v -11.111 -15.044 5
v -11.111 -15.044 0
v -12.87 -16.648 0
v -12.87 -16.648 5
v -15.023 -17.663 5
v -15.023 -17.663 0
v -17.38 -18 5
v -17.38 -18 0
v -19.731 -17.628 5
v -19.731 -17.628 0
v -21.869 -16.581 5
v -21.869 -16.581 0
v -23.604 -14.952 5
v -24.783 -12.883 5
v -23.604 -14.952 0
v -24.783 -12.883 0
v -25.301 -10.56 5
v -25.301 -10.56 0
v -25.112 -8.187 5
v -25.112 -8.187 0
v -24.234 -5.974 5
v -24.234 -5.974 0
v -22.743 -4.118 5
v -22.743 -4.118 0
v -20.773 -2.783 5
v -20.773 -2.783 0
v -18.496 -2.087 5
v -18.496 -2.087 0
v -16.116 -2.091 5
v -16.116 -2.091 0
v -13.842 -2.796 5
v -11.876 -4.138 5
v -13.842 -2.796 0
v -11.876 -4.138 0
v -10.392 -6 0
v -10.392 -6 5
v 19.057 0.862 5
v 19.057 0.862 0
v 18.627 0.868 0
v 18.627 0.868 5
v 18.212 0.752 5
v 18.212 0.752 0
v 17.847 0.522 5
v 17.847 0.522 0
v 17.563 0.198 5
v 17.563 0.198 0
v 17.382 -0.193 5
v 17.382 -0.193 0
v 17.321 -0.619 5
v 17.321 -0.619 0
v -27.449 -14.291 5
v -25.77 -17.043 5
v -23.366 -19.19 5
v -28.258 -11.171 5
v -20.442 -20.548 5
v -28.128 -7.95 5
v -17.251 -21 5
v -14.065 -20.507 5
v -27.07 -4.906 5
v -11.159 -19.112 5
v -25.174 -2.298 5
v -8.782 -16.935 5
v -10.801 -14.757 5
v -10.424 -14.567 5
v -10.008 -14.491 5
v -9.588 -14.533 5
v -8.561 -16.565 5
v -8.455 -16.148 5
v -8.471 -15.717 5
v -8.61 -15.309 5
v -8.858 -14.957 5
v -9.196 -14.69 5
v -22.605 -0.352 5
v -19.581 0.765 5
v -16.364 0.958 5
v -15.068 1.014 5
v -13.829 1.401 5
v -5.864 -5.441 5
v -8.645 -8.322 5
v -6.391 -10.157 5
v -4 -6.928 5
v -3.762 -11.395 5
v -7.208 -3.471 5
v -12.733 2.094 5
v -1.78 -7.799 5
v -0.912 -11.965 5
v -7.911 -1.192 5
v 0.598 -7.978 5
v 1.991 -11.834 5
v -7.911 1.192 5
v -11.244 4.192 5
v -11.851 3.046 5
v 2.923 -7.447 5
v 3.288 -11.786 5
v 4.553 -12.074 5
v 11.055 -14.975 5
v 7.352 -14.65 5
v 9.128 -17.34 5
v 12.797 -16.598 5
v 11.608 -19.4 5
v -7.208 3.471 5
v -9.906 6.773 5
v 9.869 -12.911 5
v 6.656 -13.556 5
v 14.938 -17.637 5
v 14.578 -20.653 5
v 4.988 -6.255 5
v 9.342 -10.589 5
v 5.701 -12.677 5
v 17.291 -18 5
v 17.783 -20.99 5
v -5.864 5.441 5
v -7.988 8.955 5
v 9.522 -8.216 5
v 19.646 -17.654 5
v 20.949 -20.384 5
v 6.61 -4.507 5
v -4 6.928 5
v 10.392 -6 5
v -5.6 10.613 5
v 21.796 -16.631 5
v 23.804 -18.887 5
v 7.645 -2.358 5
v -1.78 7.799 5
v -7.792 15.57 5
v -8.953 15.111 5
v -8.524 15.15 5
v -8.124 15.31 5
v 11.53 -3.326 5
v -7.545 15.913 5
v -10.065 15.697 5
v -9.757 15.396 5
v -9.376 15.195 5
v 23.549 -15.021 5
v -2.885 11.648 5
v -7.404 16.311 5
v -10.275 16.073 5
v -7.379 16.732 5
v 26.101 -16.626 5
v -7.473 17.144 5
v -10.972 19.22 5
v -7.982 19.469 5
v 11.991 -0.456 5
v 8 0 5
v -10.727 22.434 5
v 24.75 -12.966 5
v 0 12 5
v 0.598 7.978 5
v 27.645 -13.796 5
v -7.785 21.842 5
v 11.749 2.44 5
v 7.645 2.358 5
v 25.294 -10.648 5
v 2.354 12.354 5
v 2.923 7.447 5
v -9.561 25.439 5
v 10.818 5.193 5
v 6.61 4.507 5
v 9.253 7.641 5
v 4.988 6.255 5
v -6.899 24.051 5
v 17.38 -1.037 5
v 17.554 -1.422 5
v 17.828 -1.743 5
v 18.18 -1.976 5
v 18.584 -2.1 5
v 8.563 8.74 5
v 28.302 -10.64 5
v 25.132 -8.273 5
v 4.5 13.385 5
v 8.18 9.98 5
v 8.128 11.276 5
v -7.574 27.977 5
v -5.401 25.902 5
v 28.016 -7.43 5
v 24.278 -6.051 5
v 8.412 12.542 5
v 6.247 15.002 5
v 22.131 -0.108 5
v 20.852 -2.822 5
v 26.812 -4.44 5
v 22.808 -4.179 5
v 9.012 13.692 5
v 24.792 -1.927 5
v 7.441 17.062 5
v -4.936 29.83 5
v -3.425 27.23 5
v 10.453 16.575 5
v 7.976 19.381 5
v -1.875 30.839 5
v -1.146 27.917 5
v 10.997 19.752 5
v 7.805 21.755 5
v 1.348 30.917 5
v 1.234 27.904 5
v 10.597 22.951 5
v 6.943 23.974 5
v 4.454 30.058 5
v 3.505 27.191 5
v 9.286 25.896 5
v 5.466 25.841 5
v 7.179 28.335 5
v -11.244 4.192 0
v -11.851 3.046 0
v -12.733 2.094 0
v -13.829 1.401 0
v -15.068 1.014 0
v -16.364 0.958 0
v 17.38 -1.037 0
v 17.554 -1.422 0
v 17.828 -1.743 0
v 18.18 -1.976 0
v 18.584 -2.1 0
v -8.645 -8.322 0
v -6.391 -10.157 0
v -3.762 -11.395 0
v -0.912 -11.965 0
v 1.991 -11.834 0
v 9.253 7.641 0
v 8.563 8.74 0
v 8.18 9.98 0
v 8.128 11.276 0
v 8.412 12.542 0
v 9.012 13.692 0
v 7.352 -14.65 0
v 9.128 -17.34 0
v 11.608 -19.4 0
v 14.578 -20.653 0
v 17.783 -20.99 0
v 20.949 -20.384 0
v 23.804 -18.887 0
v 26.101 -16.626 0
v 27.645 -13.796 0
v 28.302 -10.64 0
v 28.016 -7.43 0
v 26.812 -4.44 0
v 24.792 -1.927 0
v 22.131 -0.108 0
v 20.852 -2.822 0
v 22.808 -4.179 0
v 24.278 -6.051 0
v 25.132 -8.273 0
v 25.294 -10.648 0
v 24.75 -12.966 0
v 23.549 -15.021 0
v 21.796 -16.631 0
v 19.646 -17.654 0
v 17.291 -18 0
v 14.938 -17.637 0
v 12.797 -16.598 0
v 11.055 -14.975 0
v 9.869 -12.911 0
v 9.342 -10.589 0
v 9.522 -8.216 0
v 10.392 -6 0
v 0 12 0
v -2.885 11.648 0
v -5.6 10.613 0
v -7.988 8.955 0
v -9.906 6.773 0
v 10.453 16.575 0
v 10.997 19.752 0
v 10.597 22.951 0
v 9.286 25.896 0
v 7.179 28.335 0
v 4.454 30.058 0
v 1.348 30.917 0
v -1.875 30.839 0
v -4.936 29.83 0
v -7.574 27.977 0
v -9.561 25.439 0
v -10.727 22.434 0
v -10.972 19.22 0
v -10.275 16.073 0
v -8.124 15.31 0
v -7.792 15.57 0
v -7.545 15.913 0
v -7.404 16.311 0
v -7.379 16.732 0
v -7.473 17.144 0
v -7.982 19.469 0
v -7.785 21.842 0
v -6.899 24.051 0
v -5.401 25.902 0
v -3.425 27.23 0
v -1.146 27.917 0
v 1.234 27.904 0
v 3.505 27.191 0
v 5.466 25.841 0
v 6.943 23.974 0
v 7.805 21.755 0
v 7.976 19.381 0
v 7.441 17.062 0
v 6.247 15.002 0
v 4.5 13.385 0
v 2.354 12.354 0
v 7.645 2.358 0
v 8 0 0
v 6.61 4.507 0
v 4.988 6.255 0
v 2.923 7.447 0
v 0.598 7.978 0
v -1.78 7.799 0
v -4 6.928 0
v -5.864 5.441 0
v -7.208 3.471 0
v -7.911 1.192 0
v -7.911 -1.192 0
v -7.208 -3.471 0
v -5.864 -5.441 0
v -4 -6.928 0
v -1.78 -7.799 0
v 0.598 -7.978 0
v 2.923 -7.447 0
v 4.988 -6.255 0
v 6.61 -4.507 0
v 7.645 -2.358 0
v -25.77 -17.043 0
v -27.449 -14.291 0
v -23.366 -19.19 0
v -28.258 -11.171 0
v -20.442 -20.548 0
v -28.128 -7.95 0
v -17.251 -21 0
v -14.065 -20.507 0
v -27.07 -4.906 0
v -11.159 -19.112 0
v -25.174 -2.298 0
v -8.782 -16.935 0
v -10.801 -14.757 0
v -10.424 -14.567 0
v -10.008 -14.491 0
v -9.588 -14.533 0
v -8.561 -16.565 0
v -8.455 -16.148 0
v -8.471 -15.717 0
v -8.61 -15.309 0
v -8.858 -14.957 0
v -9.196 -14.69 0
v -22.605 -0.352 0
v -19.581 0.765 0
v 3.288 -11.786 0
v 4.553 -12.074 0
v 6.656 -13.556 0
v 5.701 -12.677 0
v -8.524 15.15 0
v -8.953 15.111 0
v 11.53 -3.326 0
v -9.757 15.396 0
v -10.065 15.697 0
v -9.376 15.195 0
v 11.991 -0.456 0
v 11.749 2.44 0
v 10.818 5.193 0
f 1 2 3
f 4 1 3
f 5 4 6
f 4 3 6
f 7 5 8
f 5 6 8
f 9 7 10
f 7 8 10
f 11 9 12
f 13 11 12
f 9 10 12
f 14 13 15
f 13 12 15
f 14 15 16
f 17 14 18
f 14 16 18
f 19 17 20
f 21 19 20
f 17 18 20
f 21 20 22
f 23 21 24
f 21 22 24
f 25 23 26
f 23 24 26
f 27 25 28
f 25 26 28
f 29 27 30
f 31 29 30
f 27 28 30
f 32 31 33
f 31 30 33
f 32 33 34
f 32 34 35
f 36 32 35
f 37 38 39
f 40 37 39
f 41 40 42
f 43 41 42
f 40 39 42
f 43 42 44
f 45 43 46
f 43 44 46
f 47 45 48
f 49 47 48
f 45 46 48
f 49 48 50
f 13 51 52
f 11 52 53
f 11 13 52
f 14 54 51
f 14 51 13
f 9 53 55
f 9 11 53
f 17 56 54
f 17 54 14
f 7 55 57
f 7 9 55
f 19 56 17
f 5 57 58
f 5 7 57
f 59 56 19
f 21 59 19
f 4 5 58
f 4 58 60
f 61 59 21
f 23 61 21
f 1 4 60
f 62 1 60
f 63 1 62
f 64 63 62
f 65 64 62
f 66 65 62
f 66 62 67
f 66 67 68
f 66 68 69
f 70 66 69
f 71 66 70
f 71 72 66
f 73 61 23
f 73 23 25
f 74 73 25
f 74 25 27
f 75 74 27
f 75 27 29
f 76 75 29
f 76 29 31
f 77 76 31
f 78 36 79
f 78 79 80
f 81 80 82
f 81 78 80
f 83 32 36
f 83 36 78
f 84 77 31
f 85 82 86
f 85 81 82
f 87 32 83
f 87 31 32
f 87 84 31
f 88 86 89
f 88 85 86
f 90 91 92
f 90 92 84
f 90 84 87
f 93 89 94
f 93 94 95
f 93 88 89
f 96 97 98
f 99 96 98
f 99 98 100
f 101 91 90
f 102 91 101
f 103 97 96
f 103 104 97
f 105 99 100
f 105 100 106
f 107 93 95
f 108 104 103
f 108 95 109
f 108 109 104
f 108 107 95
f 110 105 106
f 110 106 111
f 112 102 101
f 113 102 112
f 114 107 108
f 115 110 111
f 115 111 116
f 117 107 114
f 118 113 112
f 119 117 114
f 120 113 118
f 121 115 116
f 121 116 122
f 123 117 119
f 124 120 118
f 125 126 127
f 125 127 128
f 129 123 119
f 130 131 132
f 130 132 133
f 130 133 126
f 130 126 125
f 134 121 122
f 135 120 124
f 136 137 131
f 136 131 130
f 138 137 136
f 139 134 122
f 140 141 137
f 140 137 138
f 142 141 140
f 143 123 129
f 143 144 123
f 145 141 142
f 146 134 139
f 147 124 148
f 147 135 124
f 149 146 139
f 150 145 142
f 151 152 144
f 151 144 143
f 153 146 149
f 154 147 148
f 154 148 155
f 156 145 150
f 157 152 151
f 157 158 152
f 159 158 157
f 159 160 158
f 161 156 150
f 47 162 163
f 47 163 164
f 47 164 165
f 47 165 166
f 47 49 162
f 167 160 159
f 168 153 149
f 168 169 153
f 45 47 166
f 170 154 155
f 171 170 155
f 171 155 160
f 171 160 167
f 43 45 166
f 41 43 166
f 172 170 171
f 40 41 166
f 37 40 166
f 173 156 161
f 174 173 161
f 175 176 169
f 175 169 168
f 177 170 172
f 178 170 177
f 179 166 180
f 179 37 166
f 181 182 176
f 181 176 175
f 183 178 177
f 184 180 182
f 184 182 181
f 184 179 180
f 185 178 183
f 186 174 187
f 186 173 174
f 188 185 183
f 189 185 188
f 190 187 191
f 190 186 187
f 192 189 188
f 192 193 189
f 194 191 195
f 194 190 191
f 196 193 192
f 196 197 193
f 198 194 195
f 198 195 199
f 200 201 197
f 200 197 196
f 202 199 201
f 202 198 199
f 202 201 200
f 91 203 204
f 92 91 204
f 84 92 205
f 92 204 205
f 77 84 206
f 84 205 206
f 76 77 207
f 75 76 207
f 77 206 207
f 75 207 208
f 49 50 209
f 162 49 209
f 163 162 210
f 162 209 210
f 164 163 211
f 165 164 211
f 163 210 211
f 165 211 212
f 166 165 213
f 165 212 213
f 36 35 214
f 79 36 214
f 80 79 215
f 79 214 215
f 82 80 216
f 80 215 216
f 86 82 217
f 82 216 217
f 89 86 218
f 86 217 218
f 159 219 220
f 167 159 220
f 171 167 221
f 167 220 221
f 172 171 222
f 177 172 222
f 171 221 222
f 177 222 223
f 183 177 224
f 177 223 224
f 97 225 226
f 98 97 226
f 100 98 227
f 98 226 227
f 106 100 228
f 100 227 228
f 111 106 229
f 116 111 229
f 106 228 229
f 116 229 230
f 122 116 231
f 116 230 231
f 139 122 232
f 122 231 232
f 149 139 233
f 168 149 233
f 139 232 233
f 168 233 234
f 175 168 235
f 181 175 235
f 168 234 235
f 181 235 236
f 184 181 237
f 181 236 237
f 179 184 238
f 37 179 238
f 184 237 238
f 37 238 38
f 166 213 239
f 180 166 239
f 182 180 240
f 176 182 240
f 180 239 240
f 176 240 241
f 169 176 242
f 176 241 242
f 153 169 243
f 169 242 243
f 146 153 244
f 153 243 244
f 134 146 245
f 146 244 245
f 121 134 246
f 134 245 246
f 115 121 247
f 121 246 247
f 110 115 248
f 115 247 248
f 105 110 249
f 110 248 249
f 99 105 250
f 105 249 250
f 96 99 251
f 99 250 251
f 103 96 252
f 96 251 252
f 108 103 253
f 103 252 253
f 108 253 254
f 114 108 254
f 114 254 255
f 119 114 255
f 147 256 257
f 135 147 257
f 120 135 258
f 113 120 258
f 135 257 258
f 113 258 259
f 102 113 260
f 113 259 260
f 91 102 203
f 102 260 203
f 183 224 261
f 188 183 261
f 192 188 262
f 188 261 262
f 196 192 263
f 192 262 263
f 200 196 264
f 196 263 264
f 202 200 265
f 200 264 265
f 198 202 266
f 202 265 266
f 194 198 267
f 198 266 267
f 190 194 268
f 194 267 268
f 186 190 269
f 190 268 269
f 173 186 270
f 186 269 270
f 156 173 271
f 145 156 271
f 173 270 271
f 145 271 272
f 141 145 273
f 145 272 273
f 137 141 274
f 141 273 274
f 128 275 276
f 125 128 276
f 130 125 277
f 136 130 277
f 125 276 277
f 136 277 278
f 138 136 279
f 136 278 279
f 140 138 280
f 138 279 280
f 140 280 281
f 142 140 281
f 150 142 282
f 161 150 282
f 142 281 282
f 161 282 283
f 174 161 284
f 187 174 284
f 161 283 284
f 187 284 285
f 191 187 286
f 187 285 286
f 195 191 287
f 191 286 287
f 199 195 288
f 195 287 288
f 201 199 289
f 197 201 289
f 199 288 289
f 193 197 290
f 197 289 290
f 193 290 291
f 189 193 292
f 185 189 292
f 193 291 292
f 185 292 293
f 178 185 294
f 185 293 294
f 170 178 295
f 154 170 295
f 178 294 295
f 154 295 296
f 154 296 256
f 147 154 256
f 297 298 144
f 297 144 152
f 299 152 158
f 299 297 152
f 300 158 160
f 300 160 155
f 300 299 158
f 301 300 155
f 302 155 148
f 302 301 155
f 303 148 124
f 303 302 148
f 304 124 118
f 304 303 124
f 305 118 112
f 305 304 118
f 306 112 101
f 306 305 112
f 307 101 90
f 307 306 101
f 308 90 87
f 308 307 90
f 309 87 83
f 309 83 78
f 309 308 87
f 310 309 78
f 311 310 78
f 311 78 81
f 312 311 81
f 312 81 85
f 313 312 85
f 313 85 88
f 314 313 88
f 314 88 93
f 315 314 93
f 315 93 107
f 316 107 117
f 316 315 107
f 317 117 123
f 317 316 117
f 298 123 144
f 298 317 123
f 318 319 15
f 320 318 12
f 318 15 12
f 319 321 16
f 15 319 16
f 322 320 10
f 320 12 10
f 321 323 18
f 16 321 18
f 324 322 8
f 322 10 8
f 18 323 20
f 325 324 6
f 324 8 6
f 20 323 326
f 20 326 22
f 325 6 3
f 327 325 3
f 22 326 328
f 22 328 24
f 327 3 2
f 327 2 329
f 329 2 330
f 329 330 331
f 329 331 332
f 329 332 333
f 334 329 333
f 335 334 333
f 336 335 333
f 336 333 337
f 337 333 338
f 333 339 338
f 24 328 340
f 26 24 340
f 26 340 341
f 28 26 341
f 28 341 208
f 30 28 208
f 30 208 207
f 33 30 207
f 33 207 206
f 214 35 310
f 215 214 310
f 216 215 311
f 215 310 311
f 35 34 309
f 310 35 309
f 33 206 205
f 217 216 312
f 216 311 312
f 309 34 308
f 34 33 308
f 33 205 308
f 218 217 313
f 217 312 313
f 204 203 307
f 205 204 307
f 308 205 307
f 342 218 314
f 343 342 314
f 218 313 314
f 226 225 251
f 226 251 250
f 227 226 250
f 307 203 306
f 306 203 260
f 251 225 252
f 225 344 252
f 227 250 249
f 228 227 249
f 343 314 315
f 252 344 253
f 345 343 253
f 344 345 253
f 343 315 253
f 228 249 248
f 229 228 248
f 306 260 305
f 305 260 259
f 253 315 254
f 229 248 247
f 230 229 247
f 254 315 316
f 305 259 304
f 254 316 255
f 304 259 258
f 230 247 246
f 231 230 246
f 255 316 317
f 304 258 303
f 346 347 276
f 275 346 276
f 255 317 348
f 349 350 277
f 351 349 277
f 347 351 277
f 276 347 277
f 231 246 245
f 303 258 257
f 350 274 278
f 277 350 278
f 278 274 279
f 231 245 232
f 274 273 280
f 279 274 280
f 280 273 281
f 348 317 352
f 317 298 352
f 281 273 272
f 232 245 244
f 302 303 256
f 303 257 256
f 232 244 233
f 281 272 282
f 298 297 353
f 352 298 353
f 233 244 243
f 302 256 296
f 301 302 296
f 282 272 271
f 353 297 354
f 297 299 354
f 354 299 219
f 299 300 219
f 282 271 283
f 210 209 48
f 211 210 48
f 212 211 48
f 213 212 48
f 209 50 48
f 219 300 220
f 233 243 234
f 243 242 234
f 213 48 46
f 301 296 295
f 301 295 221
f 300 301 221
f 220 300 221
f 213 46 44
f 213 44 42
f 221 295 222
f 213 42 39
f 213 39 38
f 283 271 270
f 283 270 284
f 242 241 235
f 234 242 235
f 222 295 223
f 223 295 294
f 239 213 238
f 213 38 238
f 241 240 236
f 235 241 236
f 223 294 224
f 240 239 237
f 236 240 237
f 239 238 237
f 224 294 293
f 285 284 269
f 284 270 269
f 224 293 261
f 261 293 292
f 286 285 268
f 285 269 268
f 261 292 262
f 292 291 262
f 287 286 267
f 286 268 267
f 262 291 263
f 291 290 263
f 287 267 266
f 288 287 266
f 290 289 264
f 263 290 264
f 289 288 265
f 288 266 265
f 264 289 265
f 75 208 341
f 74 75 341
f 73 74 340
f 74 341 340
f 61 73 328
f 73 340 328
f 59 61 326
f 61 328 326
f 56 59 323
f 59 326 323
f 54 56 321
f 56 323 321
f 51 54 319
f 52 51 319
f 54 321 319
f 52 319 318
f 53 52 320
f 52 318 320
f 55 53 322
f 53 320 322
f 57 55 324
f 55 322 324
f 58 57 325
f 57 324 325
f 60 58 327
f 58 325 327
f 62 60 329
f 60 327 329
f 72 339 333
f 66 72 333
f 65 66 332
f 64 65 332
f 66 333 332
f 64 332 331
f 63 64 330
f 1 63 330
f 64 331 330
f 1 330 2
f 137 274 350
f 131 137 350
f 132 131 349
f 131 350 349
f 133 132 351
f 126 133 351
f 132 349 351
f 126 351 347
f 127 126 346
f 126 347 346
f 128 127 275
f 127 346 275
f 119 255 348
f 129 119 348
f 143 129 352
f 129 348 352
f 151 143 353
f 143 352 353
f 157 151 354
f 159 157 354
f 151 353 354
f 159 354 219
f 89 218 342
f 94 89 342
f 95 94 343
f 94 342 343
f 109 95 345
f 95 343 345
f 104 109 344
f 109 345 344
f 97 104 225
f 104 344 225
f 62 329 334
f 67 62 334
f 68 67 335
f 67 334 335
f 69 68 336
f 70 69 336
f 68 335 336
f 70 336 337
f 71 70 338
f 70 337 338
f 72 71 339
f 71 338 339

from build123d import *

# Parameters (mm, degrees)
F0_R     = 8
F1_DEPTH = 5


with BuildPart() as f1:
    # F0 (on Top) → F1 (new body)
    with BuildSketch(Plane.XY):
        with BuildLine():
            ThreePointArc((-7.472874, 17.144103), (4.536123, 26.589658), (0, 12))
            ThreePointArc((0, 12), (-6.844348, 9.856719), (-11.243802, 4.192483))
            ThreePointArc((-11.243802, 4.192483), (-13.258407, 1.712126), (-16.363653, 0.958304))
            ThreePointArc((-16.363653, 0.958304), (-27.448872, -14.291414), (-8.782148, -16.935157))
            ThreePointArc((-8.782148, -16.935157), (-8.471386, -15.717191), (-9.19647, -14.690416))
            ThreePointArc((-9.19647, -14.690416), (-10.218732, -14.51437), (-11.110792, -15.043751))
            ThreePointArc((-11.110792, -15.043751), (-25.295381, -9.366431), (-10.392305, -6))
            ThreePointArc((-10.392305, -6), (-5.113995, -10.855739), (1.991104, -11.83366))
            ThreePointArc((1.991104, -11.83366), (5.146458, -12.33818), (7.351911, -14.650492))
            ThreePointArc((7.351911, -14.650492), (26.101164, -16.625714), (19.05735, 0.862015))
            ThreePointArc((19.05735, 0.862015), (17.84718, 0.52216), (17.320508, -0.619168))
            ThreePointArc((17.320508, -0.619168), (17.679179, -1.592497), (18.583666, -2.100352))
            ThreePointArc((18.583666, -2.100352), (20.759257, -17.223227), (10.392305, -6))
            ThreePointArc((10.392305, -6), (11.958343, 0.99902), (9.252698, 7.641176))
            ThreePointArc((9.252698, 7.641176), (8.111948, 10.626054), (9.011742, 13.692188))
            ThreePointArc((9.011742, 13.692188), (1.347709, 30.917128), (-10.275202, 16.073142))
            ThreePointArc((-10.275202, 16.073142), (-9.375794, 15.195031), (-8.124038, 15.309584))
            ThreePointArc((-8.124038, 15.309584), (-7.460447, 16.106867), (-7.472874, 17.144103))
        make_face()
        Circle(F0_R, mode=Mode.SUBTRACT)
    extrude(amount=F1_DEPTH)


solid = f1.part
